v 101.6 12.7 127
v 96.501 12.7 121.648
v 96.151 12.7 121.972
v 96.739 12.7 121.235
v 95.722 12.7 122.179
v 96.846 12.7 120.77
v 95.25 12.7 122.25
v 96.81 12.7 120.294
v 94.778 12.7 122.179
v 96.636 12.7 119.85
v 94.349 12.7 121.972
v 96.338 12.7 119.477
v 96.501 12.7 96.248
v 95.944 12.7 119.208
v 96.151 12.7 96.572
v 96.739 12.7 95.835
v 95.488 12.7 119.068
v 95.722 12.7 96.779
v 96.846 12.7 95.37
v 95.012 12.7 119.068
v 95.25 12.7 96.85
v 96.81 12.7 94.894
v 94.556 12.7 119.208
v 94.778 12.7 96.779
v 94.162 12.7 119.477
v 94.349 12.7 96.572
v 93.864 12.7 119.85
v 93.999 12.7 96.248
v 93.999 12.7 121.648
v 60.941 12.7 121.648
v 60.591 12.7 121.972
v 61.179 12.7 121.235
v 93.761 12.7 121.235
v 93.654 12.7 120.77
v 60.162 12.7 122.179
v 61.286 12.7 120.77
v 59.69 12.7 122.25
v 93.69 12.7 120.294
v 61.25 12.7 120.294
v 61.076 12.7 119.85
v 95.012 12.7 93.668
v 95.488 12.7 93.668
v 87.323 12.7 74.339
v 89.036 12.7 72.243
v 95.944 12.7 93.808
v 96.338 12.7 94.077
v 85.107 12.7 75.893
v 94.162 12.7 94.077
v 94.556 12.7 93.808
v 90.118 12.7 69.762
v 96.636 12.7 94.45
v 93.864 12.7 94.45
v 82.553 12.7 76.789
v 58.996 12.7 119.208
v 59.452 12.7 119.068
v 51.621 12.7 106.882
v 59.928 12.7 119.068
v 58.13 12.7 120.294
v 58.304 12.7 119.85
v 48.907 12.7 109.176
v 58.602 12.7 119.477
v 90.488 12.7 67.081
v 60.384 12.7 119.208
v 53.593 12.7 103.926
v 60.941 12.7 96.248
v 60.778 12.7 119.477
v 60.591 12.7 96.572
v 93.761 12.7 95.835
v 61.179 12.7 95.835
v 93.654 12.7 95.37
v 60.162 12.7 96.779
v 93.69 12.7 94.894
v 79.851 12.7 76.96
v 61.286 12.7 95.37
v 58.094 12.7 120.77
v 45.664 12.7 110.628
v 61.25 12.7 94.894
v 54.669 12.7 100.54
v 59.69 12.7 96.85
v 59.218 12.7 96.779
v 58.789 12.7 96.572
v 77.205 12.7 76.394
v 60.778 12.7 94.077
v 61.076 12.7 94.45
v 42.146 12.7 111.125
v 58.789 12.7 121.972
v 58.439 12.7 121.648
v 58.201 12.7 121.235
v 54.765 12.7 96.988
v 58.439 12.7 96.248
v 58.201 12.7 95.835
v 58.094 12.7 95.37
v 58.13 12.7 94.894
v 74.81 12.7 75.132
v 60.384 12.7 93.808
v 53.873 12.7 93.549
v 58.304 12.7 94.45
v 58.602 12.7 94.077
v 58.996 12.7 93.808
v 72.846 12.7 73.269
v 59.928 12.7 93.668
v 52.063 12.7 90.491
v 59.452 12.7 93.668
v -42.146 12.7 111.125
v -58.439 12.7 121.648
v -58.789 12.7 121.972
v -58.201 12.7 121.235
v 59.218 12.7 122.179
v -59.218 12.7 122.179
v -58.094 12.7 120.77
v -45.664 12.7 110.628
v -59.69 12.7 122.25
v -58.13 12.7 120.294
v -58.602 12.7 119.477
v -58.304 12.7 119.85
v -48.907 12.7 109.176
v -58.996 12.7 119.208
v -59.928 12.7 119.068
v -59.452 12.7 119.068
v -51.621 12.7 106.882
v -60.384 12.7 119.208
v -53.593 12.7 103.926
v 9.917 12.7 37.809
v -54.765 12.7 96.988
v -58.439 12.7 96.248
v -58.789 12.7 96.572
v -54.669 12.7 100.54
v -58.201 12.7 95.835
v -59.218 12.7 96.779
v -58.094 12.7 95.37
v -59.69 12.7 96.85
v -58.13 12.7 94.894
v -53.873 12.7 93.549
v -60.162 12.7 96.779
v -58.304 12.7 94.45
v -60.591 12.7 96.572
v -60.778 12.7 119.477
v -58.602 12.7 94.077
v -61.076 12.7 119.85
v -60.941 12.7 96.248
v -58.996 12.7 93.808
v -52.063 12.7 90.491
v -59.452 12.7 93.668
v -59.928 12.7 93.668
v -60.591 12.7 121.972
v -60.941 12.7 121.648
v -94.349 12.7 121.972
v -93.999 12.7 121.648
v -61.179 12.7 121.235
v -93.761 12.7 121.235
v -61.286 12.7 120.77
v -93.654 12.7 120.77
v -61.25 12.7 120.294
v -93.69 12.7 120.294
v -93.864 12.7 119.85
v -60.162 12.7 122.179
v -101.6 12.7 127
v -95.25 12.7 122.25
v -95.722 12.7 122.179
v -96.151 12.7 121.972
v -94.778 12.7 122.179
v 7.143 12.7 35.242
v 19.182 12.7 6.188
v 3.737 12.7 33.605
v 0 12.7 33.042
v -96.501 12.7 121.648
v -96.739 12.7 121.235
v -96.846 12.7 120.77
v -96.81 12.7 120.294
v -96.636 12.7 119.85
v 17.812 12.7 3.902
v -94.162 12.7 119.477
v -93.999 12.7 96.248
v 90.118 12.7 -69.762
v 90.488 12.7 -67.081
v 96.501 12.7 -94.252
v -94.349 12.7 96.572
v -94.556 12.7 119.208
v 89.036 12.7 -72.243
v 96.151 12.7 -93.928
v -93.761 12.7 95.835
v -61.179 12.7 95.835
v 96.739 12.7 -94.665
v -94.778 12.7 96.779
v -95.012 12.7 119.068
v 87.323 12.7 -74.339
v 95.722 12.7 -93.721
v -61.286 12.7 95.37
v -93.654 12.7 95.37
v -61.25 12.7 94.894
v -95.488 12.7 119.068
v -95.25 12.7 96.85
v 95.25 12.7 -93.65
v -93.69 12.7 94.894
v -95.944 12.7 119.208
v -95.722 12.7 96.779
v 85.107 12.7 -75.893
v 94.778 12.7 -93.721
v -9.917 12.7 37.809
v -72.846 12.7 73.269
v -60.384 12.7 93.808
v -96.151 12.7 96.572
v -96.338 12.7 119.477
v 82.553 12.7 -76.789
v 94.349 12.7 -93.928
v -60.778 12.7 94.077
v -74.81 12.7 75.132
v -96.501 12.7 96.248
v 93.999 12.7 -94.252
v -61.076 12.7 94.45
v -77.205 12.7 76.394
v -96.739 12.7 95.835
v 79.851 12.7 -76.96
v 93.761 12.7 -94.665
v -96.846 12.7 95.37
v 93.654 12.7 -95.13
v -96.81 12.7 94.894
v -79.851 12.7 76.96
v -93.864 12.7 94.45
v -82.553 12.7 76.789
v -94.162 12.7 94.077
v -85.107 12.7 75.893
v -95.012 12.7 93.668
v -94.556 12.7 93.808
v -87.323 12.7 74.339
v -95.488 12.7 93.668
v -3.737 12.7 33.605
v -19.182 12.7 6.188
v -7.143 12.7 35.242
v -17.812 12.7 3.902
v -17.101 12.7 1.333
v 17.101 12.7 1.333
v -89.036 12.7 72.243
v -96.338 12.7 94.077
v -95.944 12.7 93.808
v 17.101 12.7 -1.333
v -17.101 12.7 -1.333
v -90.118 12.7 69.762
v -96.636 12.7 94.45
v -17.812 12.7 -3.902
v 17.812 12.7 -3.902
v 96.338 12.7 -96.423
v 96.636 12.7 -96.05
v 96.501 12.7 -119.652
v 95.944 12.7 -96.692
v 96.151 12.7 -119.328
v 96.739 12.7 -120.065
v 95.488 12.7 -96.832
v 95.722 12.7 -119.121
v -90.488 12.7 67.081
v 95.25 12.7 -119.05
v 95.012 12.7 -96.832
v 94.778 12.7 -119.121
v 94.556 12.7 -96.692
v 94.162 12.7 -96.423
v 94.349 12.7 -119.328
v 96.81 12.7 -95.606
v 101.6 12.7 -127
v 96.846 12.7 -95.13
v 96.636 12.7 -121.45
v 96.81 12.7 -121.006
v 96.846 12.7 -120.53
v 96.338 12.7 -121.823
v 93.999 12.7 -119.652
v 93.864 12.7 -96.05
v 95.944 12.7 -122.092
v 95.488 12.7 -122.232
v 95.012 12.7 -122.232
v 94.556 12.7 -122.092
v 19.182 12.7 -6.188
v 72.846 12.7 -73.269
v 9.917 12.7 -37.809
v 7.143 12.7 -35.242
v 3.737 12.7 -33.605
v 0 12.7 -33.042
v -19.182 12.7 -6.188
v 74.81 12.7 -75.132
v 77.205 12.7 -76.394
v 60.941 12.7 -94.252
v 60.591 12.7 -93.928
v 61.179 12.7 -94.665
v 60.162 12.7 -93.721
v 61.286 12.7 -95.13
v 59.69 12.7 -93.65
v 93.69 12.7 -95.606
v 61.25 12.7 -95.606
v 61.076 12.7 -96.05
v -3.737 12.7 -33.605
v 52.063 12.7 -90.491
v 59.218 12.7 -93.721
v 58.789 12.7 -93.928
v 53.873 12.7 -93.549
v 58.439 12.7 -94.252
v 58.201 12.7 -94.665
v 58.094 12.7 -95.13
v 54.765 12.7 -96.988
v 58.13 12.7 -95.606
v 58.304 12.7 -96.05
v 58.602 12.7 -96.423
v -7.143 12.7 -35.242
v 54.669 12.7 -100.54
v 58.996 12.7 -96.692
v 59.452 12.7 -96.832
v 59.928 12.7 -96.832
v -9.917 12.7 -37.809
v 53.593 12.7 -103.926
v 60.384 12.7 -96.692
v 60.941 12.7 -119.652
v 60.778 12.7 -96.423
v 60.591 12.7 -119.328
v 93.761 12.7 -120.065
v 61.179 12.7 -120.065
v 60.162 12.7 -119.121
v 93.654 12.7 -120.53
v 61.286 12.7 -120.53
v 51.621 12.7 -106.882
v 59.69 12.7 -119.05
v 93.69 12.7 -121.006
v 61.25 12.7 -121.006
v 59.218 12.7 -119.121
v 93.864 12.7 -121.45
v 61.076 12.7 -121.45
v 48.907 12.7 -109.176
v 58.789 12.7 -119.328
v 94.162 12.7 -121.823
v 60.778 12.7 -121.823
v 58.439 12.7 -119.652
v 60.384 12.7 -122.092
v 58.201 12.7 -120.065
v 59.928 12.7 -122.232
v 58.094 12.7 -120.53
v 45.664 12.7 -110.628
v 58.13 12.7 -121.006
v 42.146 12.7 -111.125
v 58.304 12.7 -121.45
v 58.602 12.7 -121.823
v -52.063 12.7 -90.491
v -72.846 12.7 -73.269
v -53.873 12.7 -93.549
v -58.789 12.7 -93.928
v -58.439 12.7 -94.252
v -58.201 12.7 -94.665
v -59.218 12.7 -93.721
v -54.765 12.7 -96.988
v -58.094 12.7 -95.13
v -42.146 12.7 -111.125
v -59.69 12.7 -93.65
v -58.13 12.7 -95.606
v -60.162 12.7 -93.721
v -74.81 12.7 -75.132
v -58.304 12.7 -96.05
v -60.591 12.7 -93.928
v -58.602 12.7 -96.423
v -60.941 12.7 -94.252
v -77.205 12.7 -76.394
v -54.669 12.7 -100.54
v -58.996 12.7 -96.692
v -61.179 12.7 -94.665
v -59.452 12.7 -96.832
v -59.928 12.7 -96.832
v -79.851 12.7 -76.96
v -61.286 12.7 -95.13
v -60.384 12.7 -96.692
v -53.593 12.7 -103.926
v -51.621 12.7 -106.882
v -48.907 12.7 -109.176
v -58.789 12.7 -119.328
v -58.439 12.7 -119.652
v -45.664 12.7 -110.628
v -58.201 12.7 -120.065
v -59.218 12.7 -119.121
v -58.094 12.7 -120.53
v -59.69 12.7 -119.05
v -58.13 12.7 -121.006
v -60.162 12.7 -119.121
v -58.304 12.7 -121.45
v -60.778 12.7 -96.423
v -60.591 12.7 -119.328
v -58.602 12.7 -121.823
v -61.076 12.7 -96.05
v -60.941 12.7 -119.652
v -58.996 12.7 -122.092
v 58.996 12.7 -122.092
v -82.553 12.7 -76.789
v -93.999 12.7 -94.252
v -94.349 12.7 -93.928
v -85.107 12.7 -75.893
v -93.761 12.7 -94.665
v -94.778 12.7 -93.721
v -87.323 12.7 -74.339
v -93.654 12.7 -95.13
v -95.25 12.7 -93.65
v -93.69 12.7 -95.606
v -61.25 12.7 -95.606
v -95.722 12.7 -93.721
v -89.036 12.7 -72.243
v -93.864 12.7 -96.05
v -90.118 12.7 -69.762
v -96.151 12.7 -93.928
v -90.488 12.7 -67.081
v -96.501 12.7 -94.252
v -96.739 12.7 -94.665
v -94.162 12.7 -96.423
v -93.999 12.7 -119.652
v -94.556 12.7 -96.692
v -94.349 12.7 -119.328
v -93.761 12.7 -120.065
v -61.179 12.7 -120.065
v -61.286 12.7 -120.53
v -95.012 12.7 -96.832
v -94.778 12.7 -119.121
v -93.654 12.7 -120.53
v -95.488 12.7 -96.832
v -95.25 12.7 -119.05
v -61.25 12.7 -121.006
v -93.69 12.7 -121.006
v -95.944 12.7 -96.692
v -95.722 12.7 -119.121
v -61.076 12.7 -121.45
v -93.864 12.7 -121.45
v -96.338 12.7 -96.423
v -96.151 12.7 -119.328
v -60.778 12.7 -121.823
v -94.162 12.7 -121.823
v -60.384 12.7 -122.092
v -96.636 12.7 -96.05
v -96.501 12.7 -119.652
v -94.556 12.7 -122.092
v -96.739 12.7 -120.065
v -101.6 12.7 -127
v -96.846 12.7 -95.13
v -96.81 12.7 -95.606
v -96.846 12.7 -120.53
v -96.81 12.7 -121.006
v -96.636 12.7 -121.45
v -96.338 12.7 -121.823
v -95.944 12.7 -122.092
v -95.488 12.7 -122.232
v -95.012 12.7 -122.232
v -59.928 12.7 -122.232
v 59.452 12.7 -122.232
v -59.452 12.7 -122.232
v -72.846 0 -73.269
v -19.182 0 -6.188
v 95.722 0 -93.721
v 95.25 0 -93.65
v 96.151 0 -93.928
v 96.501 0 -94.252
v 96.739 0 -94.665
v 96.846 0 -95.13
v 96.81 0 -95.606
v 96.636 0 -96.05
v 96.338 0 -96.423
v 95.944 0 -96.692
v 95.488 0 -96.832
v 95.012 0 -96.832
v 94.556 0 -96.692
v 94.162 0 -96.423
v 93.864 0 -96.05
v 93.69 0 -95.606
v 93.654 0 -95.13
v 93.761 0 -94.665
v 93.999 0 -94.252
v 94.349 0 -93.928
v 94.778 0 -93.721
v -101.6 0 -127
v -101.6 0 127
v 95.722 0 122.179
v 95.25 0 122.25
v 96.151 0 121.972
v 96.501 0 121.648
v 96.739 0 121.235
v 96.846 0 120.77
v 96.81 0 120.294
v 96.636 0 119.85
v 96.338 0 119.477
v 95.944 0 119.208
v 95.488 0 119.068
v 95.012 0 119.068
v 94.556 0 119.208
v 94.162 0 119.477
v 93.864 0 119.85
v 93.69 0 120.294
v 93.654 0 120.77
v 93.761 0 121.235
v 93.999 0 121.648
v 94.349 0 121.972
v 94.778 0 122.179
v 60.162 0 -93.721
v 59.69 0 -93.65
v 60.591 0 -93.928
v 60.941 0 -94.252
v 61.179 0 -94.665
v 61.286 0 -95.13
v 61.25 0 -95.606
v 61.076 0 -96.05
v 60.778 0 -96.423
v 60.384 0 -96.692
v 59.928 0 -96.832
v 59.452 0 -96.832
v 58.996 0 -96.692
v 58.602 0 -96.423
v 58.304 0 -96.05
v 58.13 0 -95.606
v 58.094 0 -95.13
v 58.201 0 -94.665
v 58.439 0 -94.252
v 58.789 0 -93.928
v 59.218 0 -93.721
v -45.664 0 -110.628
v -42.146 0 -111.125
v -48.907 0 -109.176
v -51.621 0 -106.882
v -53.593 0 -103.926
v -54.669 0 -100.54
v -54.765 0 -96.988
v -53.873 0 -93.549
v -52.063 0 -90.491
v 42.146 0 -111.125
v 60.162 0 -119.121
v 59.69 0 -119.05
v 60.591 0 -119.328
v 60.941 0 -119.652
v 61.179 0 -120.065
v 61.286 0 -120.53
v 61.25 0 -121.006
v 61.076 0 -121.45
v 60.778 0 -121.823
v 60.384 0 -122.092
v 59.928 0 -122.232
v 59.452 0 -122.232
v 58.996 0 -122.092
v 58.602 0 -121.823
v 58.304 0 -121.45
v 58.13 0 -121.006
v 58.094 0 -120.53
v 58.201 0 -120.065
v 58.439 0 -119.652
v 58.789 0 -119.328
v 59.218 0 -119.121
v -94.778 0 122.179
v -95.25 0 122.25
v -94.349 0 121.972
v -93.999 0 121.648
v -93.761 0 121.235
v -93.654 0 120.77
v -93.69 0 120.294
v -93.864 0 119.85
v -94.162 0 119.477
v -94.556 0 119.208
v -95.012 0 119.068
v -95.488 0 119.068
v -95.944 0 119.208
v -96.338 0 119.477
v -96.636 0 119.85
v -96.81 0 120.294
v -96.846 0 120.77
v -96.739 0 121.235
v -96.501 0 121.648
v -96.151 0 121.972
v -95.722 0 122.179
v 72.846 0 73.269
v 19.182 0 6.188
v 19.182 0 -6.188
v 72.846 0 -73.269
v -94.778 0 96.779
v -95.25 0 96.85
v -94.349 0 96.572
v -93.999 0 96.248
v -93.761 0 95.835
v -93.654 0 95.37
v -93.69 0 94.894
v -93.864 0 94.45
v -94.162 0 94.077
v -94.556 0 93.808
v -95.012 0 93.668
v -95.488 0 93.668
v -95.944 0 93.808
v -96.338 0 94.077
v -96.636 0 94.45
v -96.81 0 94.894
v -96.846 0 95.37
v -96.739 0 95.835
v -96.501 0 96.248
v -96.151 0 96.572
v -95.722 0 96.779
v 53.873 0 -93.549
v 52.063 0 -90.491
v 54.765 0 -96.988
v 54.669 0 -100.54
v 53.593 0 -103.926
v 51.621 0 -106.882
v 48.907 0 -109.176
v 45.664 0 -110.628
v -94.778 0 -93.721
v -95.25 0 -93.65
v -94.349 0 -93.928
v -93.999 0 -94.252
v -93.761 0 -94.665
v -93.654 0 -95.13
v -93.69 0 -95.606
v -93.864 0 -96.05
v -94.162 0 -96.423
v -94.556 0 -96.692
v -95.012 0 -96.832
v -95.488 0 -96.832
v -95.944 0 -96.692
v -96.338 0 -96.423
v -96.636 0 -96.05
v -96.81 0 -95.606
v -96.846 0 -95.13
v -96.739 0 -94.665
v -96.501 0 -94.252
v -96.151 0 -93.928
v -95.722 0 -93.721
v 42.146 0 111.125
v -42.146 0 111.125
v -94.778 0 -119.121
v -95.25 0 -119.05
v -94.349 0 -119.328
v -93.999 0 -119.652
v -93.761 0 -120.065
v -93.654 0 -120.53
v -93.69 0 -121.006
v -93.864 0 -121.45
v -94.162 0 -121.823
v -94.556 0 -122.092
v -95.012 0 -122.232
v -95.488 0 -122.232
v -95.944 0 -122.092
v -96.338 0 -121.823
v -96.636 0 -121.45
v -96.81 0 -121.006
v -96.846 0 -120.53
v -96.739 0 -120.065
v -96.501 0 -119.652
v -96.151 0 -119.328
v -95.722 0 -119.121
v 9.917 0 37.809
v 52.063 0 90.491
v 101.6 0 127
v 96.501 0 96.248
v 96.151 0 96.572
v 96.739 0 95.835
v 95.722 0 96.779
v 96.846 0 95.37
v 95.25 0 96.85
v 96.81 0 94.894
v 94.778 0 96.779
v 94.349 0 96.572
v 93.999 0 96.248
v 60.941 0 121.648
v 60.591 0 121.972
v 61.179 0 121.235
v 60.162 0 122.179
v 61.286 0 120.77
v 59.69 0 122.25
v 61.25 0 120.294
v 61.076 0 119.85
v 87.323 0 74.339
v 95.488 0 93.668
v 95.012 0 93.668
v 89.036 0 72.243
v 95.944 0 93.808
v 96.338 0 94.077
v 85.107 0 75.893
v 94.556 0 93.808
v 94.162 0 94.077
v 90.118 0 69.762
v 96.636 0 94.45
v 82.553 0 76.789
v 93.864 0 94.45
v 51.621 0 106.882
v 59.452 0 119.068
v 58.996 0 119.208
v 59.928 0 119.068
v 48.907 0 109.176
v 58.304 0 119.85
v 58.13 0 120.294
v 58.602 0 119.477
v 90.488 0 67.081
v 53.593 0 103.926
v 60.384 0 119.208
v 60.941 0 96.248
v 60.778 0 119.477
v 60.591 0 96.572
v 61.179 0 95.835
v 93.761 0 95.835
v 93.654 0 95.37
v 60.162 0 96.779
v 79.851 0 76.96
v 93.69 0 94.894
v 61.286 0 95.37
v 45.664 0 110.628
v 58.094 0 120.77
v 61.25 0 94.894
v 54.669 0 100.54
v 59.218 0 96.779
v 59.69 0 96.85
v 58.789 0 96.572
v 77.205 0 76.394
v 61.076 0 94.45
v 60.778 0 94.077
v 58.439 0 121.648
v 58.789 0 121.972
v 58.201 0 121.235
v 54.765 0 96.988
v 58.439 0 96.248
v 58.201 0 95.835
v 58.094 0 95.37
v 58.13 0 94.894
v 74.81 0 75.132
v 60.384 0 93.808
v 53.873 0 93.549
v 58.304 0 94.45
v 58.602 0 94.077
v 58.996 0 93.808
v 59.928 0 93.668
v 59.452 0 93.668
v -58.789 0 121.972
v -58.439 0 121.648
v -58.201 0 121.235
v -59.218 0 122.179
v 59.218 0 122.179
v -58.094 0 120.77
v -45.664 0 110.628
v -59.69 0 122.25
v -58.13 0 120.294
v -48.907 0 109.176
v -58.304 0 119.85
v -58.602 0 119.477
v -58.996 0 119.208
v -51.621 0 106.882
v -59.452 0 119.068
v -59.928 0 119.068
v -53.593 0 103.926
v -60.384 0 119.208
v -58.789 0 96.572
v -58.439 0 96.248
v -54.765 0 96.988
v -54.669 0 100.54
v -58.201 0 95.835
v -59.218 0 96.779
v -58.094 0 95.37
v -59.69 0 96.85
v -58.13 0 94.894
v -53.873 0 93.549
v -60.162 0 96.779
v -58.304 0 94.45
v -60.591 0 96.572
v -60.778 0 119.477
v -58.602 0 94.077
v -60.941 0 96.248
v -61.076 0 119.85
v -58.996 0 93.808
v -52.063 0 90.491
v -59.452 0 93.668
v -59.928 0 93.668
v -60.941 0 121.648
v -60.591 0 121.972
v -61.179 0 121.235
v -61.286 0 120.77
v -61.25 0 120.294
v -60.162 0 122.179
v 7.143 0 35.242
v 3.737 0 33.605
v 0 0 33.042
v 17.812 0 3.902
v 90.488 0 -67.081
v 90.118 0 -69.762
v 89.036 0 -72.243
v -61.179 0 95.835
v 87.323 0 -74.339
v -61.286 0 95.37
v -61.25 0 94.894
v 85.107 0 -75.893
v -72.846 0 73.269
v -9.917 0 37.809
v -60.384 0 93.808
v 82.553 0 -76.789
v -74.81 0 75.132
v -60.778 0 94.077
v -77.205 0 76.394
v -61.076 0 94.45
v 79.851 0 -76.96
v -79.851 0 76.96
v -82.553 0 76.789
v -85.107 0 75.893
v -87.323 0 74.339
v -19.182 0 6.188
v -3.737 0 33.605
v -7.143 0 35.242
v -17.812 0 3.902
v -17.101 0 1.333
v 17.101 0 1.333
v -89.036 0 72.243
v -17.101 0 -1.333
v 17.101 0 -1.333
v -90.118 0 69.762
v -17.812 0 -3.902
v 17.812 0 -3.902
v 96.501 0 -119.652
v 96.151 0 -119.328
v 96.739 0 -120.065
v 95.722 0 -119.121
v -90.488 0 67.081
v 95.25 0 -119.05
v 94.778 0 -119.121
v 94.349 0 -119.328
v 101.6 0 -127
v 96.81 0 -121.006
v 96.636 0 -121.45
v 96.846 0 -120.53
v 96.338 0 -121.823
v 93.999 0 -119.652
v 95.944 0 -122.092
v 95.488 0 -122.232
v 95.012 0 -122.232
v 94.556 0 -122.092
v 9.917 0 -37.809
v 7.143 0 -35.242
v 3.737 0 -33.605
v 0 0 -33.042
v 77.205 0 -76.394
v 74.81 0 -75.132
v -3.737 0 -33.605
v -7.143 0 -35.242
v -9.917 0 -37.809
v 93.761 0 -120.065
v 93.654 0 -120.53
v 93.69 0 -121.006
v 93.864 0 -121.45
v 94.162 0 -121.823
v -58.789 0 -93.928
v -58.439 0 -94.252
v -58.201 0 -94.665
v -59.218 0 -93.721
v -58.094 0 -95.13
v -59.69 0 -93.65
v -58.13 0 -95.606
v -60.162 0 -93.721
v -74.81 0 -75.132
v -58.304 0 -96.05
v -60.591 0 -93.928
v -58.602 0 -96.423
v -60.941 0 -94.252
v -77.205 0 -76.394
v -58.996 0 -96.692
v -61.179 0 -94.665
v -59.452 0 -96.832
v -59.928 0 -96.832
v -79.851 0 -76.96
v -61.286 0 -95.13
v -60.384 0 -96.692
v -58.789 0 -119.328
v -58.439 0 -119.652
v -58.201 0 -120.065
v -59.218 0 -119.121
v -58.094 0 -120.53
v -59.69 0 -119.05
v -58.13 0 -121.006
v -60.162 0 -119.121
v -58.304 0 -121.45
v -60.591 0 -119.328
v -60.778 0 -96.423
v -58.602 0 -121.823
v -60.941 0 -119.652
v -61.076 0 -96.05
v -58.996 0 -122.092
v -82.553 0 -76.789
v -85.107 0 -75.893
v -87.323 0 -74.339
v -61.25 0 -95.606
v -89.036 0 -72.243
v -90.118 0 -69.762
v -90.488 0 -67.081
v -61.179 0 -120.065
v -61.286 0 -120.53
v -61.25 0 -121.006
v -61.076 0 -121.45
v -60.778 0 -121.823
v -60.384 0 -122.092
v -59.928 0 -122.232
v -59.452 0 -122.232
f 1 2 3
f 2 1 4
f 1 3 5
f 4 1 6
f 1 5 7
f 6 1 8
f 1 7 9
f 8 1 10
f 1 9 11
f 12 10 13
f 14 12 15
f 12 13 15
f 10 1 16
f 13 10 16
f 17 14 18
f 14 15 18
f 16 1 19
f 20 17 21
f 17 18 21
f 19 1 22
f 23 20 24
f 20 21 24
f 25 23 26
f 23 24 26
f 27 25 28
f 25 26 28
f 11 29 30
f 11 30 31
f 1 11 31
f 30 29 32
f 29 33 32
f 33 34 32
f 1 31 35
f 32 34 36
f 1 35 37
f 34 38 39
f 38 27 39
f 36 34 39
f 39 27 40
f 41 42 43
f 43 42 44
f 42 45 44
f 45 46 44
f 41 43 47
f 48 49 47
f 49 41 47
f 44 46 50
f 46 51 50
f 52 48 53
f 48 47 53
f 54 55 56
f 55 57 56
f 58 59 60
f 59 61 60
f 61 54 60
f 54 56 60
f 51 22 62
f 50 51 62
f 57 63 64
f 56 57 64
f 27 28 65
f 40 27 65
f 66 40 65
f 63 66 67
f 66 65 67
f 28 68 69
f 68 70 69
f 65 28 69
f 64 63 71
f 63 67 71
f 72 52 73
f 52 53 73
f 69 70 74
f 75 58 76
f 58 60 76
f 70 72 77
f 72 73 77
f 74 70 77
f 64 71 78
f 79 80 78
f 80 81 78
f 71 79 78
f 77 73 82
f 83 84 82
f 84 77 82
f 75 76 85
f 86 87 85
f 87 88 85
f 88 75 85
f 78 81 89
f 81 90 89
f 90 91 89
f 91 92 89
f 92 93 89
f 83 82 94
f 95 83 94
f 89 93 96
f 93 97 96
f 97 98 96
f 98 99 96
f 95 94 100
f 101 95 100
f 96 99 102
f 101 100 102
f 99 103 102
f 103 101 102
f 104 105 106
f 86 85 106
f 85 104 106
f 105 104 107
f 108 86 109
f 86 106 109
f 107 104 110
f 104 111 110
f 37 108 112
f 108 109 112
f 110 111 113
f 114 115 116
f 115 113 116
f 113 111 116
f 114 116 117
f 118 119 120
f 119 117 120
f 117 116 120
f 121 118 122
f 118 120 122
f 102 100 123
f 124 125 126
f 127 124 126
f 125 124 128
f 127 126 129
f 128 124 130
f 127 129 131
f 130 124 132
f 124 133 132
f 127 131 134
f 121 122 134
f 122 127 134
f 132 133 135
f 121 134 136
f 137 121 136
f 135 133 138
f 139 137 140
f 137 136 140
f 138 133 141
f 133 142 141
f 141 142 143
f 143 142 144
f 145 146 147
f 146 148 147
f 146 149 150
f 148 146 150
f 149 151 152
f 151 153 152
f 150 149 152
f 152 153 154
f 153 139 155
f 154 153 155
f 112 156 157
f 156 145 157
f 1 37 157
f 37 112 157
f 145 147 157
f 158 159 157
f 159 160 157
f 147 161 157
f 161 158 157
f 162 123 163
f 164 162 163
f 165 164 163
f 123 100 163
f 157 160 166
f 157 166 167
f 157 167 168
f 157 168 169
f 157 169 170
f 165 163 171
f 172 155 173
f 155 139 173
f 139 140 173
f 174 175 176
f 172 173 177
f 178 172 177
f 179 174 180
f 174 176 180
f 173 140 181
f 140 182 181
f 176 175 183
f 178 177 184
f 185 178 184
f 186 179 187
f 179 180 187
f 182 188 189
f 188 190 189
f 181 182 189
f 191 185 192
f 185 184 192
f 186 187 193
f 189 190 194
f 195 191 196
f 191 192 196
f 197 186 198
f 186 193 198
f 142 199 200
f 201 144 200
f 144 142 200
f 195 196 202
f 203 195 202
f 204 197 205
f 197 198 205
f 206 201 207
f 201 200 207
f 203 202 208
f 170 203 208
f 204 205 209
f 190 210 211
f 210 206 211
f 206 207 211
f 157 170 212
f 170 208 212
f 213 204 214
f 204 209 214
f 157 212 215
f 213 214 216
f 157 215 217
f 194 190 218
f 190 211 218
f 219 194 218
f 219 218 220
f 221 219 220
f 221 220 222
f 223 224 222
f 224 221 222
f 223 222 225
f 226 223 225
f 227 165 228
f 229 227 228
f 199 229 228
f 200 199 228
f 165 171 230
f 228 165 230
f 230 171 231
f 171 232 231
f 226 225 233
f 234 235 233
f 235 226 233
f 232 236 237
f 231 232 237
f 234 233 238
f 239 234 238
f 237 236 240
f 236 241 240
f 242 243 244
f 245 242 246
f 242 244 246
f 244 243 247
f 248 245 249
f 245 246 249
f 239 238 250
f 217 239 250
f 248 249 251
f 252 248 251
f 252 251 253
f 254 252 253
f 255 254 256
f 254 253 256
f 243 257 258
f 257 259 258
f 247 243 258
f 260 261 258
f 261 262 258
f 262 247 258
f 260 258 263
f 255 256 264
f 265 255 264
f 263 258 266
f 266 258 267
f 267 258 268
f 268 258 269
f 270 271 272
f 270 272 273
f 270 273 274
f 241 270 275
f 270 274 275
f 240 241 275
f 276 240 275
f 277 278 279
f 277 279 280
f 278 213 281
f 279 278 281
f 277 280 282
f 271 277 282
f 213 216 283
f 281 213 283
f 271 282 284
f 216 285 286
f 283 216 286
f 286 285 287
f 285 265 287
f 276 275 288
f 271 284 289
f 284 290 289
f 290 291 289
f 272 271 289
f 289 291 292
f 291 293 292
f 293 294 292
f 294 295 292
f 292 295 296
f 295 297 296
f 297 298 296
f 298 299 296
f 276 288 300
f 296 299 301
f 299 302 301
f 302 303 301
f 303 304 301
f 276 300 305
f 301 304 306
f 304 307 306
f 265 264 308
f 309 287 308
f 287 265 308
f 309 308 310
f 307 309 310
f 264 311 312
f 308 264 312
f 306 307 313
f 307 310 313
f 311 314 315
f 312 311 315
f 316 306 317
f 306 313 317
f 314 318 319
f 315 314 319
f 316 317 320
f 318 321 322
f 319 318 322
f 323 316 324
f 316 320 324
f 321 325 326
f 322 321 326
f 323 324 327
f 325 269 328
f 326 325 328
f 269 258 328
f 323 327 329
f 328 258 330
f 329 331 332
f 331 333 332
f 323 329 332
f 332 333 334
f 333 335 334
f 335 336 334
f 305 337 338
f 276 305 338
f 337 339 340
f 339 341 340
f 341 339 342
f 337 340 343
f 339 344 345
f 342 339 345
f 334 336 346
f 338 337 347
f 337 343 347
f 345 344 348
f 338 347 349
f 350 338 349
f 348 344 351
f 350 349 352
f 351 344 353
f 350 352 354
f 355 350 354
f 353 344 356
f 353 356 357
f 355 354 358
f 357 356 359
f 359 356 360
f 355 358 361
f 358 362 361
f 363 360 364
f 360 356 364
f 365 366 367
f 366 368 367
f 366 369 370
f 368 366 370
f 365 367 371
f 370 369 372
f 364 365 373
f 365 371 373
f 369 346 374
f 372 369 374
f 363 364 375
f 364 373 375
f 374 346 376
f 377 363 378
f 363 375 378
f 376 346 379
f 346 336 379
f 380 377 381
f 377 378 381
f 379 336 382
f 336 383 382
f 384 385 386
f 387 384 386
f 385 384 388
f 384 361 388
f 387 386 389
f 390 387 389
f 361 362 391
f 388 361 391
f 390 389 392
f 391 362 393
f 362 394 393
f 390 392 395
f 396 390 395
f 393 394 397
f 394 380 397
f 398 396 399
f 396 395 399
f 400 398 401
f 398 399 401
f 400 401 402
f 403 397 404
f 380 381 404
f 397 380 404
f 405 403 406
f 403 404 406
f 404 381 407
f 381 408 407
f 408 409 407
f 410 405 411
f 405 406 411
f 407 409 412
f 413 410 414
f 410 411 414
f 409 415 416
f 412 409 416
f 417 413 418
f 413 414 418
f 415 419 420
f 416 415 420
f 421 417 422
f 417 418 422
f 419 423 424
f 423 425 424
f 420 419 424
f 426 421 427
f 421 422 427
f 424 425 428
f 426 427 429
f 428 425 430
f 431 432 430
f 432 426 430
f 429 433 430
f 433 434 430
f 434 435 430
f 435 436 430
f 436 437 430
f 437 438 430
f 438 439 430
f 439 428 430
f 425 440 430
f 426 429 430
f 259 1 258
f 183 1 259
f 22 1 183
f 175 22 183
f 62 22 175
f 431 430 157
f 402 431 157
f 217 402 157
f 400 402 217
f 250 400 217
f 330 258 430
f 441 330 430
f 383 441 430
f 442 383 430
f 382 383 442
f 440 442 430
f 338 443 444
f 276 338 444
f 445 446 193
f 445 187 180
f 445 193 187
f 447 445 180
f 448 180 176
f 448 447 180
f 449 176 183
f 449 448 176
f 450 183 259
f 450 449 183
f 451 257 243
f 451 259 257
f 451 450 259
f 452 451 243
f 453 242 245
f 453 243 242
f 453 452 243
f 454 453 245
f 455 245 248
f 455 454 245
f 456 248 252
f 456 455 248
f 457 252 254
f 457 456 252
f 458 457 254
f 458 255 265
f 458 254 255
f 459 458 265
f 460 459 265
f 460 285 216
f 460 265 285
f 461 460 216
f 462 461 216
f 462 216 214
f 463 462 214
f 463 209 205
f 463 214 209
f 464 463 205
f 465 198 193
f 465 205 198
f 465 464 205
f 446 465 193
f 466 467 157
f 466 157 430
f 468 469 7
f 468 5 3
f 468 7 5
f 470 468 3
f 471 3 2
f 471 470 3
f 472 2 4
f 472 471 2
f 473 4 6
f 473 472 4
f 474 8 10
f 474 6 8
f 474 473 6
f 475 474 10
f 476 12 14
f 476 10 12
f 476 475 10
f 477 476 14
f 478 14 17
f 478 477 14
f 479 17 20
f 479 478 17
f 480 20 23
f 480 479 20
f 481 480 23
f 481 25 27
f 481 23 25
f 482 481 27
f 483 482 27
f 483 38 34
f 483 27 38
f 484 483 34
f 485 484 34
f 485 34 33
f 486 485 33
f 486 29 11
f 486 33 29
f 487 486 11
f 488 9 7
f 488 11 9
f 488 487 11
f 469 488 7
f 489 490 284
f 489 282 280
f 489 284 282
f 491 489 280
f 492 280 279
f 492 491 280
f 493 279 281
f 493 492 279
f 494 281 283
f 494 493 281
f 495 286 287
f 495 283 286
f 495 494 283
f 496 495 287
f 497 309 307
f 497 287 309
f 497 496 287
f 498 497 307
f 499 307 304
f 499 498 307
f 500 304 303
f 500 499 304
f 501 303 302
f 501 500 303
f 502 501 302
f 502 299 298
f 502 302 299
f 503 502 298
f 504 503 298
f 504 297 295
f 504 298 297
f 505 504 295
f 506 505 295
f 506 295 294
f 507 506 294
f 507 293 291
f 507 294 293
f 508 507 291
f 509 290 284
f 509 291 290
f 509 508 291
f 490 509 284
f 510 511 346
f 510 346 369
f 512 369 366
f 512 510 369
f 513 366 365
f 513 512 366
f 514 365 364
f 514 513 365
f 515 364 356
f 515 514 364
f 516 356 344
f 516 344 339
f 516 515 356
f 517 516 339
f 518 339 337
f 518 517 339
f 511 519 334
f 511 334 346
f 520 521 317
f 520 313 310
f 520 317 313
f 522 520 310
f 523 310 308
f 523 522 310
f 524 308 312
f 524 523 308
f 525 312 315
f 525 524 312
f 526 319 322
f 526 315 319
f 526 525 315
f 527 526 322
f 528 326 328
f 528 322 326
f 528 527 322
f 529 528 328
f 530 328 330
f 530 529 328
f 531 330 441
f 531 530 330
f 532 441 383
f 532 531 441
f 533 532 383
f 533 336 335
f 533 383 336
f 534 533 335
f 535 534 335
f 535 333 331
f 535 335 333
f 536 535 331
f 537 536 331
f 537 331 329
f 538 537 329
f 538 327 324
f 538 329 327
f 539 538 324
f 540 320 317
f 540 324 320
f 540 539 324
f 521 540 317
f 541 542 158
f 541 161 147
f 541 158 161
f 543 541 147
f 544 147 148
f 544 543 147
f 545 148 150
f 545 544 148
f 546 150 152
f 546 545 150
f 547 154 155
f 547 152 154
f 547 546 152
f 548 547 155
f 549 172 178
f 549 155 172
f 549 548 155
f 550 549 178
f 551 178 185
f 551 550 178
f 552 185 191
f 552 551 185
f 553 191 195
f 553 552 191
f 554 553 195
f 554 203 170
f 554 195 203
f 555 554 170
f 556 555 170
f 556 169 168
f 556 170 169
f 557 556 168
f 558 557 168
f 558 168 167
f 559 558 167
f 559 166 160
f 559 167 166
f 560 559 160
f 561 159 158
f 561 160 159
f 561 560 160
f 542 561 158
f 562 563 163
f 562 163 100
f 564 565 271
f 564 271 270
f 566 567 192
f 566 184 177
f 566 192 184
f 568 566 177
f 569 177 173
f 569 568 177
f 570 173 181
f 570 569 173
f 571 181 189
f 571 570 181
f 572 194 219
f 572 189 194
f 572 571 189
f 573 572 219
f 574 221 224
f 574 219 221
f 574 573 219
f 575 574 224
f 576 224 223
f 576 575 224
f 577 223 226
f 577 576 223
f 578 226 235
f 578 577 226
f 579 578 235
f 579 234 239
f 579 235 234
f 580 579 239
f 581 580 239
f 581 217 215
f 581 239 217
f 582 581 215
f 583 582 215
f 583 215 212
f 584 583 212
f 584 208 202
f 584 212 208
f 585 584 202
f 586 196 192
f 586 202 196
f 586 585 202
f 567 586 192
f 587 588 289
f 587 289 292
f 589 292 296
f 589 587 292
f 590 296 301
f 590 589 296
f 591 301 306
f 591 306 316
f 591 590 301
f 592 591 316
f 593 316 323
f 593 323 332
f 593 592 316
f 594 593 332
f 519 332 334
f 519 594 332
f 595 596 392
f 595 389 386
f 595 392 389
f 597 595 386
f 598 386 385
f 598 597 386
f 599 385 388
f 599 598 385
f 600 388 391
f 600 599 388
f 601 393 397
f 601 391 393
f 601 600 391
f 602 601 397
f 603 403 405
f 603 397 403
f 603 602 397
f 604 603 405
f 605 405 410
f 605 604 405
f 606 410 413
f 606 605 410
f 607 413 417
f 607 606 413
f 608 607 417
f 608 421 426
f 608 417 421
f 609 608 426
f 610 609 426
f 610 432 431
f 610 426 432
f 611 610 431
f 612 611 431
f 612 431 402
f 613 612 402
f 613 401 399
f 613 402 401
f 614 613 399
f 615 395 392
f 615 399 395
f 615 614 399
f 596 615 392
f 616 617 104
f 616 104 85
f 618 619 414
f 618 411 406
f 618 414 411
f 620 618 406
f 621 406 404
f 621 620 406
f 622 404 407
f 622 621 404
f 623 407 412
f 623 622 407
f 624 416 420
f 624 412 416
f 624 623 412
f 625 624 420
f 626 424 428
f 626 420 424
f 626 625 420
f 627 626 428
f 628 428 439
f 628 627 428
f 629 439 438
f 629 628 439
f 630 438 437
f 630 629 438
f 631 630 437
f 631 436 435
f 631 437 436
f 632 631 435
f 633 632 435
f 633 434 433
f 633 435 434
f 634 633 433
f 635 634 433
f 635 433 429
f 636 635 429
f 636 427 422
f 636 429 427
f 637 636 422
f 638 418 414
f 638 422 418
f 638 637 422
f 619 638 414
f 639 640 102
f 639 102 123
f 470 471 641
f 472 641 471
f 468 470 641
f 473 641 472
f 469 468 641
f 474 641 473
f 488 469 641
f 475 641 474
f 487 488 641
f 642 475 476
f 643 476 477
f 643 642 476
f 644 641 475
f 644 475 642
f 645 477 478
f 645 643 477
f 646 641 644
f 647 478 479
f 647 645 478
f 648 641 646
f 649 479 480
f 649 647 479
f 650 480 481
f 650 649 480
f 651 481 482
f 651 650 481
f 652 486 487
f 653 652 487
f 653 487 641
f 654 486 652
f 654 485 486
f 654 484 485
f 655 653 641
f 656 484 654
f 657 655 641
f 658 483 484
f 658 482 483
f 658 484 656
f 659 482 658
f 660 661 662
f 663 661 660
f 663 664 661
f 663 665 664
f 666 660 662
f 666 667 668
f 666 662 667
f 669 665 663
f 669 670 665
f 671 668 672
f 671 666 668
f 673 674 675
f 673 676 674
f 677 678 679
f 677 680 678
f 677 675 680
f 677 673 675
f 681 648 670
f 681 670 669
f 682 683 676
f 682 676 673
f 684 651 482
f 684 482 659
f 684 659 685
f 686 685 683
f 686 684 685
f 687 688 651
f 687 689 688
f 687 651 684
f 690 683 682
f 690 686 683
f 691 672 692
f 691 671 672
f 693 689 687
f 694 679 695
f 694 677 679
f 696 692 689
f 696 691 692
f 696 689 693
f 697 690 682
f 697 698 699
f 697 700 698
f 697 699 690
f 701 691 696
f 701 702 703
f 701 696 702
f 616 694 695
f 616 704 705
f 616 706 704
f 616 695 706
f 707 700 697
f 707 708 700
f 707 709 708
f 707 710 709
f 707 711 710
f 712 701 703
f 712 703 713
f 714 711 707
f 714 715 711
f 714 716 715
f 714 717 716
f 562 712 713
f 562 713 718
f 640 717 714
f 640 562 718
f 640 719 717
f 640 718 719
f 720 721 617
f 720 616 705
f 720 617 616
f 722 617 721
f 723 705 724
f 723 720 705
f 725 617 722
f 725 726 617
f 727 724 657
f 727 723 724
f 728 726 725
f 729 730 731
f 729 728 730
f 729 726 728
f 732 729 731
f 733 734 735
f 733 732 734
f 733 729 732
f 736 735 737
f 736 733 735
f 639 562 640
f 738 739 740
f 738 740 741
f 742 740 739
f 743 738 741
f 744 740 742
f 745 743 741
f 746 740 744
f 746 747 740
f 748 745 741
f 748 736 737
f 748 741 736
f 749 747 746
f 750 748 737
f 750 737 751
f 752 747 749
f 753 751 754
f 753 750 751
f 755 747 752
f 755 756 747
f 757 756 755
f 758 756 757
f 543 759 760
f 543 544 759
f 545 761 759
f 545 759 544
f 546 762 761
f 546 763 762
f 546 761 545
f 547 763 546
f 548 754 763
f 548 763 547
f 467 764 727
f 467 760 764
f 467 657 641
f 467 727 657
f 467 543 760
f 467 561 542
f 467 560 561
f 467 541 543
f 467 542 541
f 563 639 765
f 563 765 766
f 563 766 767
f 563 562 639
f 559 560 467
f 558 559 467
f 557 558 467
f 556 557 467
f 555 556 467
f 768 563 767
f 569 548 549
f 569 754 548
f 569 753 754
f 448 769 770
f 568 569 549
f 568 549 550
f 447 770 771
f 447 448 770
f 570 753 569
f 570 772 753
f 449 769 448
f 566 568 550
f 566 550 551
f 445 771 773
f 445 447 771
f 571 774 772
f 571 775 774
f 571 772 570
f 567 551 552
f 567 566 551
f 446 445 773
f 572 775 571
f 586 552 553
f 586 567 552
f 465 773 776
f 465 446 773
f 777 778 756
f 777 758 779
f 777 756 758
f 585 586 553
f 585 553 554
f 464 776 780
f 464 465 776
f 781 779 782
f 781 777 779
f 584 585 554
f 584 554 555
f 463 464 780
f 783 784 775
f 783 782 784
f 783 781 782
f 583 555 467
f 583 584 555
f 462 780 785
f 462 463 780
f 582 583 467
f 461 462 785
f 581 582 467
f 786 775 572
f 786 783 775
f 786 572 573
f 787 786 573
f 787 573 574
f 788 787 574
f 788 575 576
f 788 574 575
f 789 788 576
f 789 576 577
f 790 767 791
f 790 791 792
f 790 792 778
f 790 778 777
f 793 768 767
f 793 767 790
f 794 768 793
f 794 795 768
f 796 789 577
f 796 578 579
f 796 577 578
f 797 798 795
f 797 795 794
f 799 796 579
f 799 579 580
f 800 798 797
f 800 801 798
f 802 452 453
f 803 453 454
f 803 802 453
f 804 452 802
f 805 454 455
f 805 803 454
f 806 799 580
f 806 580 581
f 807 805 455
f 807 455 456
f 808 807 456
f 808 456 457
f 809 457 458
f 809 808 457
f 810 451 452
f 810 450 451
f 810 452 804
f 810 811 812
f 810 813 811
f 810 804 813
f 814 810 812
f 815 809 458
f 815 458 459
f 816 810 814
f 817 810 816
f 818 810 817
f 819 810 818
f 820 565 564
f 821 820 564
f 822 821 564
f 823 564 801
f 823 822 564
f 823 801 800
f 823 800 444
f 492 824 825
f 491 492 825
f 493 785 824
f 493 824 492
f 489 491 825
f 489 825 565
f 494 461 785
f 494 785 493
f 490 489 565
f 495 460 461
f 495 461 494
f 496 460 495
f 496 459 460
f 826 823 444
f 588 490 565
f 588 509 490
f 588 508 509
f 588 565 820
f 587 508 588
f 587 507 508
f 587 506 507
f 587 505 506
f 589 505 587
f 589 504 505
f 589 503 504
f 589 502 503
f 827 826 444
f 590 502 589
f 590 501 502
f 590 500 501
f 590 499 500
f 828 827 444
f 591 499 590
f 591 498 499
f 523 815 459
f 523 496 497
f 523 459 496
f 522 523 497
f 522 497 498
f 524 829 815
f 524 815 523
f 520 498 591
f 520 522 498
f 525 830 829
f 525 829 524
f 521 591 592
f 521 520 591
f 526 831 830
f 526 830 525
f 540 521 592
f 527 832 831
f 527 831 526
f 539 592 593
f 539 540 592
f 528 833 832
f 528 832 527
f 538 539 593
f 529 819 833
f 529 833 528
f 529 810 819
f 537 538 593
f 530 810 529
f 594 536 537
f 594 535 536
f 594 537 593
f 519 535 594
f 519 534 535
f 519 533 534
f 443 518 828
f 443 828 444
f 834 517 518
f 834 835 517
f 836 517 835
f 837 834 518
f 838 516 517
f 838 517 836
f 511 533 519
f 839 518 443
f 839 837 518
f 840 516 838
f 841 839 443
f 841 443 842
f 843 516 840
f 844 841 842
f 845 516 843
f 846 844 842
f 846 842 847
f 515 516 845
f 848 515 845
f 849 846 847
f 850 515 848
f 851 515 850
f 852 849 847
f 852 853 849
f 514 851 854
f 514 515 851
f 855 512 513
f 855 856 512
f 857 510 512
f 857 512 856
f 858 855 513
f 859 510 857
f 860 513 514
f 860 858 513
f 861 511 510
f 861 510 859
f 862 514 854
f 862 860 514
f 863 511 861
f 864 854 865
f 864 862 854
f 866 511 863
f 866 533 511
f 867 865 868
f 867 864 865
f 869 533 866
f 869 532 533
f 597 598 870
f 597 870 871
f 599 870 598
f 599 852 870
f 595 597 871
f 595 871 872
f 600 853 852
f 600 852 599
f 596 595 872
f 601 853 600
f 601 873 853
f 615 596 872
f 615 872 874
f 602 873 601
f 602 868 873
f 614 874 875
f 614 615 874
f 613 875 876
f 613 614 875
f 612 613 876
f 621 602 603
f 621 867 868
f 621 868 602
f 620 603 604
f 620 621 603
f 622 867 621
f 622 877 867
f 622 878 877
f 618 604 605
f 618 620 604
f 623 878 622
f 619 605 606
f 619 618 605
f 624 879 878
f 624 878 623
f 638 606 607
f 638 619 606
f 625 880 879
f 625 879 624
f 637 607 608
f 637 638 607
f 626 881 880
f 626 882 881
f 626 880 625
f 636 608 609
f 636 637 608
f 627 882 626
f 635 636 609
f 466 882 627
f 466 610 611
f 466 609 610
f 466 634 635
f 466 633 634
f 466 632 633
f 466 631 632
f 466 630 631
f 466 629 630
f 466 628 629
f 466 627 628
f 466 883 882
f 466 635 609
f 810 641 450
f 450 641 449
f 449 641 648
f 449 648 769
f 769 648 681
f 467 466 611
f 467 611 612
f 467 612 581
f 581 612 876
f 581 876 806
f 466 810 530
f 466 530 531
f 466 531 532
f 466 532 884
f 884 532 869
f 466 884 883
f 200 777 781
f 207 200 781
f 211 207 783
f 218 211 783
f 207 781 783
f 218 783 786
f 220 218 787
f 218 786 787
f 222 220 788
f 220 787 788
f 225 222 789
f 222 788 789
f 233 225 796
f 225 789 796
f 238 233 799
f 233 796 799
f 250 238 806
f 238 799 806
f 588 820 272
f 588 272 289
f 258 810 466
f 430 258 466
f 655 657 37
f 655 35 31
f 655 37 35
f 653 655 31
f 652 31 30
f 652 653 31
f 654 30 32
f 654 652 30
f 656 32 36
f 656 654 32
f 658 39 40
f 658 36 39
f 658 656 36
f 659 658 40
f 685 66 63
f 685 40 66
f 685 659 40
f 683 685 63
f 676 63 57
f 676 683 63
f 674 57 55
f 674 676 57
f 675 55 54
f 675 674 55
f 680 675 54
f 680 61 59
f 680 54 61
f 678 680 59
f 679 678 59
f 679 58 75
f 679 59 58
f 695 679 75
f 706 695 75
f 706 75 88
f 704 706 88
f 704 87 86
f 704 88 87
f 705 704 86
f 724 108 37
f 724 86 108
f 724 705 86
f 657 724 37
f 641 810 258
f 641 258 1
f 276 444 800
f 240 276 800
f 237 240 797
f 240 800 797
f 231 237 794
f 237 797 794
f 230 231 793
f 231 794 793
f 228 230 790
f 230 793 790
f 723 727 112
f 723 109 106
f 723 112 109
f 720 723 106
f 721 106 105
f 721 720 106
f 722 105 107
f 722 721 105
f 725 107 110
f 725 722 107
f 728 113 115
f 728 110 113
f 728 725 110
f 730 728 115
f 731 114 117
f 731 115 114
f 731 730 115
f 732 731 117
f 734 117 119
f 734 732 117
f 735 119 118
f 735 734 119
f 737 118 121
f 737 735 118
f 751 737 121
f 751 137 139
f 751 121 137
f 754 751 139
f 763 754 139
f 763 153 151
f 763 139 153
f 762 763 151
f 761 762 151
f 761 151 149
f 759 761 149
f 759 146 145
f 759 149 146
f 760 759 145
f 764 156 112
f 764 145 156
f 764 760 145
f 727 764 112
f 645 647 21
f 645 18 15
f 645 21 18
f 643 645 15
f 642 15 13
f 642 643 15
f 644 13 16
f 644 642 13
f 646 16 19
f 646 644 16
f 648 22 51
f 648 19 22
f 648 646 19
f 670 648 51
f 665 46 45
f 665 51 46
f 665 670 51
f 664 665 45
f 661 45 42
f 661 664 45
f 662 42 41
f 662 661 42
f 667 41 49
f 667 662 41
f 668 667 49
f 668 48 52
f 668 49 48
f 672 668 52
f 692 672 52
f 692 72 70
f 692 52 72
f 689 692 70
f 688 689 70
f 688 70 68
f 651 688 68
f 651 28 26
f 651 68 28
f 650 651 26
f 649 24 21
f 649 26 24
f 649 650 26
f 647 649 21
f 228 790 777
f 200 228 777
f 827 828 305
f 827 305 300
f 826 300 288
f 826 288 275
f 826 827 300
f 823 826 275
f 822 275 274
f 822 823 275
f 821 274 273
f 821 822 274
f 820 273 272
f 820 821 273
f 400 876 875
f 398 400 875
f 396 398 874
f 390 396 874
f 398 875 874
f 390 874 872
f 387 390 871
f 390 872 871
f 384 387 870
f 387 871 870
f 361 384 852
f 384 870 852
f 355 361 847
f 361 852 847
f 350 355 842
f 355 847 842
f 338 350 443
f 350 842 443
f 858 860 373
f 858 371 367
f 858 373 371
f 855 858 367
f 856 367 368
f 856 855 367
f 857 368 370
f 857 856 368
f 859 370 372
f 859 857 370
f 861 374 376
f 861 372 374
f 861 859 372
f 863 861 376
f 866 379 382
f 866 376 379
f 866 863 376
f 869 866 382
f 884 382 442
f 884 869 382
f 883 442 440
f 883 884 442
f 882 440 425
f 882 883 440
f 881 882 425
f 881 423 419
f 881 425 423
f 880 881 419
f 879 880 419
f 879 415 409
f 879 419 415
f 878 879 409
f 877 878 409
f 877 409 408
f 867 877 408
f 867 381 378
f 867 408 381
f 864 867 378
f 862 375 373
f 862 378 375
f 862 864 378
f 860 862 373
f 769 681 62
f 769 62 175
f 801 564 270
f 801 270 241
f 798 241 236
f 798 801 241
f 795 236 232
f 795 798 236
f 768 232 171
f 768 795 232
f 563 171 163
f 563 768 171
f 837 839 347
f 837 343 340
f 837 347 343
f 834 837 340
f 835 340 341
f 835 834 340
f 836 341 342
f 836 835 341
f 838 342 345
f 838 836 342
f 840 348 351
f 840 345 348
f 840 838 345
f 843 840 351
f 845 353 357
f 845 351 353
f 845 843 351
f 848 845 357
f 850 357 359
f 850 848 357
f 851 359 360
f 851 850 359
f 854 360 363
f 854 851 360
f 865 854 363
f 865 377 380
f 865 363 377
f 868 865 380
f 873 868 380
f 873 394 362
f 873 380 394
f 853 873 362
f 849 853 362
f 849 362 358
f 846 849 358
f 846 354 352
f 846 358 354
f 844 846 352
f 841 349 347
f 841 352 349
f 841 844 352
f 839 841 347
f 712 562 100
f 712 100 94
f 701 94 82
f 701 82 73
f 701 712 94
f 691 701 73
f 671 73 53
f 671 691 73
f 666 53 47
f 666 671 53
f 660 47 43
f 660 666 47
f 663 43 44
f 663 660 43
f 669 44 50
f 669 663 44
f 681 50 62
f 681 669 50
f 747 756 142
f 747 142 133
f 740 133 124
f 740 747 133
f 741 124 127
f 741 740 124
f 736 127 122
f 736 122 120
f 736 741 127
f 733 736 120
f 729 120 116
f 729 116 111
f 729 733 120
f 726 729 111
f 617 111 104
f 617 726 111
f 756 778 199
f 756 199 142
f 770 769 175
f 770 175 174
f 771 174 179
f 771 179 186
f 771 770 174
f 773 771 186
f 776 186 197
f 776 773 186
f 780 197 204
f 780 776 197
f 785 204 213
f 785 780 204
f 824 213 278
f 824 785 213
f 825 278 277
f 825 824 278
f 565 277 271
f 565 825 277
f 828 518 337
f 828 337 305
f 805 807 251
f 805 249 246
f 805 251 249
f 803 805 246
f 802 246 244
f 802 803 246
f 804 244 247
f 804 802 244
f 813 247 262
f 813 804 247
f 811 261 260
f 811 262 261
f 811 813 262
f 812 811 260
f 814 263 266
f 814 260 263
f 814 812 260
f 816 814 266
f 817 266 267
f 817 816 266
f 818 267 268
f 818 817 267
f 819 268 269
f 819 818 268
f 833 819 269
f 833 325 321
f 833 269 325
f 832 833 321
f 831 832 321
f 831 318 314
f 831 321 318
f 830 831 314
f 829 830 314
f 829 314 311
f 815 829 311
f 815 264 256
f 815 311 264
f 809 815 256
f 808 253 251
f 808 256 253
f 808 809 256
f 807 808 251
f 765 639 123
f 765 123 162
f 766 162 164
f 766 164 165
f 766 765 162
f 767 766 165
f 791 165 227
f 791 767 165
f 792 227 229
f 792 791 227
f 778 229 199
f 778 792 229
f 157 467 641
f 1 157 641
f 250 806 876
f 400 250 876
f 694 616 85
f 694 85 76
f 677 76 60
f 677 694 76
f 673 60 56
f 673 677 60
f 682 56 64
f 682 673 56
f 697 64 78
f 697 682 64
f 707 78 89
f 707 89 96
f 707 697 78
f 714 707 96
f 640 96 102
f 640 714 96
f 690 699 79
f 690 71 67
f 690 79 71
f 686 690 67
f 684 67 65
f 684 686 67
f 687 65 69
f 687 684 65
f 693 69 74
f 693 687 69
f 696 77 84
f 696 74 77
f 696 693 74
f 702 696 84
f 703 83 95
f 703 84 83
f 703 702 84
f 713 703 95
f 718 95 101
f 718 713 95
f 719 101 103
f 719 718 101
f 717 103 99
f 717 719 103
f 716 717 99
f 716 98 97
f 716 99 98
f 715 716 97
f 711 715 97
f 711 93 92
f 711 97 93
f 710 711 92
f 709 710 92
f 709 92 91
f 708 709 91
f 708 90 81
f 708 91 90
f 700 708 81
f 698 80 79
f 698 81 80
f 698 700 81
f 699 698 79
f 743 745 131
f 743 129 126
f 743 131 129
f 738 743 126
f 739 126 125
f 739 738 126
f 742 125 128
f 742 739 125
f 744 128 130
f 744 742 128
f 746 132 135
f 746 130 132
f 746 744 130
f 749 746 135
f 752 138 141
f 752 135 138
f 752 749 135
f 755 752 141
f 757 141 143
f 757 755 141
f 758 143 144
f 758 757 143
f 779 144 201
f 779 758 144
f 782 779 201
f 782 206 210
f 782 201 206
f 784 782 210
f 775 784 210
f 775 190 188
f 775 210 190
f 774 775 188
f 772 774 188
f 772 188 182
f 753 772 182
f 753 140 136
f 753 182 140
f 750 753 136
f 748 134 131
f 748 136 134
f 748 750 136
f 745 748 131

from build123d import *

# Parameters (mm, degrees)
ORIGINAL_EXTRUSTION_DEPTH            = 12.7
HOLES_FOR_WHEELS_TO_MOUNT_DEPTH      = 164.134453749
HOLES_FOR_WHEELS_TO_MOUNT_DEPTH_BACK = 164.134453749
SKETCH2_R                            = 1.6


with BuildPart() as part:
    # Sketch1 → Original Extrustion (new body)
    # profile 1 of 4: a face of its own
    with BuildSketch(Plane(origin=(0, 0, 0), x_dir=(1, 0, 0), z_dir=(0, 1, 0))):
        Polygon((-101.6, 127), (0, 0), (101.6, 127), align=None)
        with BuildLine():
            ThreePointArc((-42.146144983, 111.125), (-53.592696084, 103.926496877), (-52.063178863, 90.491372896))
            Line((-52.063178863, 90.491372896), (-9.91703388, 37.808691667))
            ThreePointArc((-9.91703388, 37.808691667), (0, 33.042318771), (9.91703388, 37.808691667))
            Line((9.91703388, 37.808691667), (52.063178863, 90.491372896))
            ThreePointArc((52.063178863, 90.491372896), (53.592696084, 103.926496877), (42.146144983, 111.125))
            Line((42.146144983, 111.125), (-42.146144983, 111.125))
        make_face(mode=Mode.SUBTRACT)
    # profile 2 of 4: a face of its own
    with BuildSketch(Plane(origin=(0, 0, 0), x_dir=(1, 0, 0), z_dir=(0, 1, 0))):
        Polygon((0, 0), (-101.6, -127), (-101.6, 127), align=None)
        with BuildLine():
            Line((-90.4875, -67.080858304), (-90.4875, 67.080858304))
            ThreePointArc((-90.4875, 67.080858304), (-83.860454762, 76.428440433), (-72.846213574, 73.269087445))
            Line((-72.846213574, 73.269087445), (-19.181526931, 6.188229141))
            ThreePointArc((-19.181526931, 6.188229141), (-17.010813357, 0), (-19.181526931, -6.188229141))
            Line((-19.181526931, -6.188229141), (-72.846213574, -73.269087445))
            ThreePointArc((-72.846213574, -73.269087445), (-83.860454762, -76.428440433), (-90.4875, -67.080858304))
        make_face(mode=Mode.SUBTRACT)
    # profile 3 of 4: a face of its own
    with BuildSketch(Plane(origin=(0, 0, 0), x_dir=(1, 0, 0), z_dir=(0, 1, 0))):
        Polygon((-101.6, -127), (101.6, -127), (0, 0), align=None)
        with BuildLine():
            Line((-42.146144983, -111.125), (42.146144983, -111.125))
            ThreePointArc((42.146144983, -111.125), (53.592696084, -103.926496877), (52.063178863, -90.491372896))
            Line((52.063178863, -90.491372896), (9.91703388, -37.808691667))
            ThreePointArc((9.91703388, -37.808691667), (0, -33.042318771), (-9.91703388, -37.808691667))
            Line((-9.91703388, -37.808691667), (-52.063178863, -90.491372896))
            ThreePointArc((-52.063178863, -90.491372896), (-53.592696084, -103.926496877), (-42.146144983, -111.125))
        make_face(mode=Mode.SUBTRACT)
    # profile 4 of 4: a face of its own
    with BuildSketch(Plane(origin=(0, 0, 0), x_dir=(1, 0, 0), z_dir=(0, 1, 0))):
        Polygon((101.6, -127), (0, 0), (101.6, 127), align=None)
        with BuildLine():
            ThreePointArc((72.846213574, -73.269087445), (83.860454762, -76.428440433), (90.4875, -67.080858304))
            Line((90.4875, -67.080858304), (90.4875, 67.080858304))
            ThreePointArc((90.4875, 67.080858304), (83.860454762, 76.428440433), (72.846213574, 73.269087445))
            Line((72.846213574, 73.269087445), (19.181526931, 6.188229141))
            ThreePointArc((19.181526931, 6.188229141), (17.010813357, 0), (19.181526931, -6.188229141))
            Line((19.181526931, -6.188229141), (72.846213574, -73.269087445))
        make_face(mode=Mode.SUBTRACT)
    extrude(amount=ORIGINAL_EXTRUSTION_DEPTH)

    # Sketch2 → Holes for Wheels to mount (cut, two sides: drawn at the far end of the back side and taken through both)
    with BuildSketch(Plane(origin=(0, 12.7, 0), x_dir=(1, 0, 0), z_dir=(0, 1, 0)).offset(-HOLES_FOR_WHEELS_TO_MOUNT_DEPTH_BACK)):
        with Locations(Location((-95.25, 120.65, 0), (0, 0, 270))):
            Circle(SKETCH2_R)
        with Locations(Location((-59.69, 120.65, 0), (0, 0, 270))):
            Circle(SKETCH2_R)
        with Locations(Location((-95.25, 95.25, 0), (0, 0, 270))):
            Circle(SKETCH2_R)
        with Locations(Location((-59.69, 95.25, 0), (0, 0, 270))):
            Circle(SKETCH2_R)
        with Locations(Location((-95.25, -95.25, 0), (0, 0, 270))):
            Circle(SKETCH2_R)
        with Locations(Location((-59.69, -95.25, 0), (0, 0, 270))):
            Circle(SKETCH2_R)
        with Locations(Location((-95.25, -120.65, 0), (0, 0, 270))):
            Circle(SKETCH2_R)
        with Locations(Location((-59.69, -120.65, 0), (0, 0, 270))):
            Circle(SKETCH2_R)
        with Locations(Location((59.69, -95.25, 0), (0, 0, 270))):
            Circle(SKETCH2_R)
        with Locations(Location((95.25, -95.25, 0), (0, 0, 270))):
            Circle(SKETCH2_R)
        with Locations(Location((59.69, -120.65, 0), (0, 0, 270))):
            Circle(SKETCH2_R)
        with Locations(Location((95.25, -120.65, 0), (0, 0, 270))):
            Circle(SKETCH2_R)
        with Locations(Location((59.69, 120.65, 0), (0, 0, 270))):
            Circle(SKETCH2_R)
        with Locations(Location((59.69, 95.25, 0), (0, 0, 270))):
            Circle(SKETCH2_R)
        with Locations(Location((95.25, 95.25, 0), (0, 0, 270))):
            Circle(SKETCH2_R)
        with Locations(Location((95.25, 120.65, 0), (0, 0, 270))):
            Circle(SKETCH2_R)
    extrude(amount=HOLES_FOR_WHEELS_TO_MOUNT_DEPTH + HOLES_FOR_WHEELS_TO_MOUNT_DEPTH_BACK, mode=Mode.SUBTRACT)


solid = part.part
